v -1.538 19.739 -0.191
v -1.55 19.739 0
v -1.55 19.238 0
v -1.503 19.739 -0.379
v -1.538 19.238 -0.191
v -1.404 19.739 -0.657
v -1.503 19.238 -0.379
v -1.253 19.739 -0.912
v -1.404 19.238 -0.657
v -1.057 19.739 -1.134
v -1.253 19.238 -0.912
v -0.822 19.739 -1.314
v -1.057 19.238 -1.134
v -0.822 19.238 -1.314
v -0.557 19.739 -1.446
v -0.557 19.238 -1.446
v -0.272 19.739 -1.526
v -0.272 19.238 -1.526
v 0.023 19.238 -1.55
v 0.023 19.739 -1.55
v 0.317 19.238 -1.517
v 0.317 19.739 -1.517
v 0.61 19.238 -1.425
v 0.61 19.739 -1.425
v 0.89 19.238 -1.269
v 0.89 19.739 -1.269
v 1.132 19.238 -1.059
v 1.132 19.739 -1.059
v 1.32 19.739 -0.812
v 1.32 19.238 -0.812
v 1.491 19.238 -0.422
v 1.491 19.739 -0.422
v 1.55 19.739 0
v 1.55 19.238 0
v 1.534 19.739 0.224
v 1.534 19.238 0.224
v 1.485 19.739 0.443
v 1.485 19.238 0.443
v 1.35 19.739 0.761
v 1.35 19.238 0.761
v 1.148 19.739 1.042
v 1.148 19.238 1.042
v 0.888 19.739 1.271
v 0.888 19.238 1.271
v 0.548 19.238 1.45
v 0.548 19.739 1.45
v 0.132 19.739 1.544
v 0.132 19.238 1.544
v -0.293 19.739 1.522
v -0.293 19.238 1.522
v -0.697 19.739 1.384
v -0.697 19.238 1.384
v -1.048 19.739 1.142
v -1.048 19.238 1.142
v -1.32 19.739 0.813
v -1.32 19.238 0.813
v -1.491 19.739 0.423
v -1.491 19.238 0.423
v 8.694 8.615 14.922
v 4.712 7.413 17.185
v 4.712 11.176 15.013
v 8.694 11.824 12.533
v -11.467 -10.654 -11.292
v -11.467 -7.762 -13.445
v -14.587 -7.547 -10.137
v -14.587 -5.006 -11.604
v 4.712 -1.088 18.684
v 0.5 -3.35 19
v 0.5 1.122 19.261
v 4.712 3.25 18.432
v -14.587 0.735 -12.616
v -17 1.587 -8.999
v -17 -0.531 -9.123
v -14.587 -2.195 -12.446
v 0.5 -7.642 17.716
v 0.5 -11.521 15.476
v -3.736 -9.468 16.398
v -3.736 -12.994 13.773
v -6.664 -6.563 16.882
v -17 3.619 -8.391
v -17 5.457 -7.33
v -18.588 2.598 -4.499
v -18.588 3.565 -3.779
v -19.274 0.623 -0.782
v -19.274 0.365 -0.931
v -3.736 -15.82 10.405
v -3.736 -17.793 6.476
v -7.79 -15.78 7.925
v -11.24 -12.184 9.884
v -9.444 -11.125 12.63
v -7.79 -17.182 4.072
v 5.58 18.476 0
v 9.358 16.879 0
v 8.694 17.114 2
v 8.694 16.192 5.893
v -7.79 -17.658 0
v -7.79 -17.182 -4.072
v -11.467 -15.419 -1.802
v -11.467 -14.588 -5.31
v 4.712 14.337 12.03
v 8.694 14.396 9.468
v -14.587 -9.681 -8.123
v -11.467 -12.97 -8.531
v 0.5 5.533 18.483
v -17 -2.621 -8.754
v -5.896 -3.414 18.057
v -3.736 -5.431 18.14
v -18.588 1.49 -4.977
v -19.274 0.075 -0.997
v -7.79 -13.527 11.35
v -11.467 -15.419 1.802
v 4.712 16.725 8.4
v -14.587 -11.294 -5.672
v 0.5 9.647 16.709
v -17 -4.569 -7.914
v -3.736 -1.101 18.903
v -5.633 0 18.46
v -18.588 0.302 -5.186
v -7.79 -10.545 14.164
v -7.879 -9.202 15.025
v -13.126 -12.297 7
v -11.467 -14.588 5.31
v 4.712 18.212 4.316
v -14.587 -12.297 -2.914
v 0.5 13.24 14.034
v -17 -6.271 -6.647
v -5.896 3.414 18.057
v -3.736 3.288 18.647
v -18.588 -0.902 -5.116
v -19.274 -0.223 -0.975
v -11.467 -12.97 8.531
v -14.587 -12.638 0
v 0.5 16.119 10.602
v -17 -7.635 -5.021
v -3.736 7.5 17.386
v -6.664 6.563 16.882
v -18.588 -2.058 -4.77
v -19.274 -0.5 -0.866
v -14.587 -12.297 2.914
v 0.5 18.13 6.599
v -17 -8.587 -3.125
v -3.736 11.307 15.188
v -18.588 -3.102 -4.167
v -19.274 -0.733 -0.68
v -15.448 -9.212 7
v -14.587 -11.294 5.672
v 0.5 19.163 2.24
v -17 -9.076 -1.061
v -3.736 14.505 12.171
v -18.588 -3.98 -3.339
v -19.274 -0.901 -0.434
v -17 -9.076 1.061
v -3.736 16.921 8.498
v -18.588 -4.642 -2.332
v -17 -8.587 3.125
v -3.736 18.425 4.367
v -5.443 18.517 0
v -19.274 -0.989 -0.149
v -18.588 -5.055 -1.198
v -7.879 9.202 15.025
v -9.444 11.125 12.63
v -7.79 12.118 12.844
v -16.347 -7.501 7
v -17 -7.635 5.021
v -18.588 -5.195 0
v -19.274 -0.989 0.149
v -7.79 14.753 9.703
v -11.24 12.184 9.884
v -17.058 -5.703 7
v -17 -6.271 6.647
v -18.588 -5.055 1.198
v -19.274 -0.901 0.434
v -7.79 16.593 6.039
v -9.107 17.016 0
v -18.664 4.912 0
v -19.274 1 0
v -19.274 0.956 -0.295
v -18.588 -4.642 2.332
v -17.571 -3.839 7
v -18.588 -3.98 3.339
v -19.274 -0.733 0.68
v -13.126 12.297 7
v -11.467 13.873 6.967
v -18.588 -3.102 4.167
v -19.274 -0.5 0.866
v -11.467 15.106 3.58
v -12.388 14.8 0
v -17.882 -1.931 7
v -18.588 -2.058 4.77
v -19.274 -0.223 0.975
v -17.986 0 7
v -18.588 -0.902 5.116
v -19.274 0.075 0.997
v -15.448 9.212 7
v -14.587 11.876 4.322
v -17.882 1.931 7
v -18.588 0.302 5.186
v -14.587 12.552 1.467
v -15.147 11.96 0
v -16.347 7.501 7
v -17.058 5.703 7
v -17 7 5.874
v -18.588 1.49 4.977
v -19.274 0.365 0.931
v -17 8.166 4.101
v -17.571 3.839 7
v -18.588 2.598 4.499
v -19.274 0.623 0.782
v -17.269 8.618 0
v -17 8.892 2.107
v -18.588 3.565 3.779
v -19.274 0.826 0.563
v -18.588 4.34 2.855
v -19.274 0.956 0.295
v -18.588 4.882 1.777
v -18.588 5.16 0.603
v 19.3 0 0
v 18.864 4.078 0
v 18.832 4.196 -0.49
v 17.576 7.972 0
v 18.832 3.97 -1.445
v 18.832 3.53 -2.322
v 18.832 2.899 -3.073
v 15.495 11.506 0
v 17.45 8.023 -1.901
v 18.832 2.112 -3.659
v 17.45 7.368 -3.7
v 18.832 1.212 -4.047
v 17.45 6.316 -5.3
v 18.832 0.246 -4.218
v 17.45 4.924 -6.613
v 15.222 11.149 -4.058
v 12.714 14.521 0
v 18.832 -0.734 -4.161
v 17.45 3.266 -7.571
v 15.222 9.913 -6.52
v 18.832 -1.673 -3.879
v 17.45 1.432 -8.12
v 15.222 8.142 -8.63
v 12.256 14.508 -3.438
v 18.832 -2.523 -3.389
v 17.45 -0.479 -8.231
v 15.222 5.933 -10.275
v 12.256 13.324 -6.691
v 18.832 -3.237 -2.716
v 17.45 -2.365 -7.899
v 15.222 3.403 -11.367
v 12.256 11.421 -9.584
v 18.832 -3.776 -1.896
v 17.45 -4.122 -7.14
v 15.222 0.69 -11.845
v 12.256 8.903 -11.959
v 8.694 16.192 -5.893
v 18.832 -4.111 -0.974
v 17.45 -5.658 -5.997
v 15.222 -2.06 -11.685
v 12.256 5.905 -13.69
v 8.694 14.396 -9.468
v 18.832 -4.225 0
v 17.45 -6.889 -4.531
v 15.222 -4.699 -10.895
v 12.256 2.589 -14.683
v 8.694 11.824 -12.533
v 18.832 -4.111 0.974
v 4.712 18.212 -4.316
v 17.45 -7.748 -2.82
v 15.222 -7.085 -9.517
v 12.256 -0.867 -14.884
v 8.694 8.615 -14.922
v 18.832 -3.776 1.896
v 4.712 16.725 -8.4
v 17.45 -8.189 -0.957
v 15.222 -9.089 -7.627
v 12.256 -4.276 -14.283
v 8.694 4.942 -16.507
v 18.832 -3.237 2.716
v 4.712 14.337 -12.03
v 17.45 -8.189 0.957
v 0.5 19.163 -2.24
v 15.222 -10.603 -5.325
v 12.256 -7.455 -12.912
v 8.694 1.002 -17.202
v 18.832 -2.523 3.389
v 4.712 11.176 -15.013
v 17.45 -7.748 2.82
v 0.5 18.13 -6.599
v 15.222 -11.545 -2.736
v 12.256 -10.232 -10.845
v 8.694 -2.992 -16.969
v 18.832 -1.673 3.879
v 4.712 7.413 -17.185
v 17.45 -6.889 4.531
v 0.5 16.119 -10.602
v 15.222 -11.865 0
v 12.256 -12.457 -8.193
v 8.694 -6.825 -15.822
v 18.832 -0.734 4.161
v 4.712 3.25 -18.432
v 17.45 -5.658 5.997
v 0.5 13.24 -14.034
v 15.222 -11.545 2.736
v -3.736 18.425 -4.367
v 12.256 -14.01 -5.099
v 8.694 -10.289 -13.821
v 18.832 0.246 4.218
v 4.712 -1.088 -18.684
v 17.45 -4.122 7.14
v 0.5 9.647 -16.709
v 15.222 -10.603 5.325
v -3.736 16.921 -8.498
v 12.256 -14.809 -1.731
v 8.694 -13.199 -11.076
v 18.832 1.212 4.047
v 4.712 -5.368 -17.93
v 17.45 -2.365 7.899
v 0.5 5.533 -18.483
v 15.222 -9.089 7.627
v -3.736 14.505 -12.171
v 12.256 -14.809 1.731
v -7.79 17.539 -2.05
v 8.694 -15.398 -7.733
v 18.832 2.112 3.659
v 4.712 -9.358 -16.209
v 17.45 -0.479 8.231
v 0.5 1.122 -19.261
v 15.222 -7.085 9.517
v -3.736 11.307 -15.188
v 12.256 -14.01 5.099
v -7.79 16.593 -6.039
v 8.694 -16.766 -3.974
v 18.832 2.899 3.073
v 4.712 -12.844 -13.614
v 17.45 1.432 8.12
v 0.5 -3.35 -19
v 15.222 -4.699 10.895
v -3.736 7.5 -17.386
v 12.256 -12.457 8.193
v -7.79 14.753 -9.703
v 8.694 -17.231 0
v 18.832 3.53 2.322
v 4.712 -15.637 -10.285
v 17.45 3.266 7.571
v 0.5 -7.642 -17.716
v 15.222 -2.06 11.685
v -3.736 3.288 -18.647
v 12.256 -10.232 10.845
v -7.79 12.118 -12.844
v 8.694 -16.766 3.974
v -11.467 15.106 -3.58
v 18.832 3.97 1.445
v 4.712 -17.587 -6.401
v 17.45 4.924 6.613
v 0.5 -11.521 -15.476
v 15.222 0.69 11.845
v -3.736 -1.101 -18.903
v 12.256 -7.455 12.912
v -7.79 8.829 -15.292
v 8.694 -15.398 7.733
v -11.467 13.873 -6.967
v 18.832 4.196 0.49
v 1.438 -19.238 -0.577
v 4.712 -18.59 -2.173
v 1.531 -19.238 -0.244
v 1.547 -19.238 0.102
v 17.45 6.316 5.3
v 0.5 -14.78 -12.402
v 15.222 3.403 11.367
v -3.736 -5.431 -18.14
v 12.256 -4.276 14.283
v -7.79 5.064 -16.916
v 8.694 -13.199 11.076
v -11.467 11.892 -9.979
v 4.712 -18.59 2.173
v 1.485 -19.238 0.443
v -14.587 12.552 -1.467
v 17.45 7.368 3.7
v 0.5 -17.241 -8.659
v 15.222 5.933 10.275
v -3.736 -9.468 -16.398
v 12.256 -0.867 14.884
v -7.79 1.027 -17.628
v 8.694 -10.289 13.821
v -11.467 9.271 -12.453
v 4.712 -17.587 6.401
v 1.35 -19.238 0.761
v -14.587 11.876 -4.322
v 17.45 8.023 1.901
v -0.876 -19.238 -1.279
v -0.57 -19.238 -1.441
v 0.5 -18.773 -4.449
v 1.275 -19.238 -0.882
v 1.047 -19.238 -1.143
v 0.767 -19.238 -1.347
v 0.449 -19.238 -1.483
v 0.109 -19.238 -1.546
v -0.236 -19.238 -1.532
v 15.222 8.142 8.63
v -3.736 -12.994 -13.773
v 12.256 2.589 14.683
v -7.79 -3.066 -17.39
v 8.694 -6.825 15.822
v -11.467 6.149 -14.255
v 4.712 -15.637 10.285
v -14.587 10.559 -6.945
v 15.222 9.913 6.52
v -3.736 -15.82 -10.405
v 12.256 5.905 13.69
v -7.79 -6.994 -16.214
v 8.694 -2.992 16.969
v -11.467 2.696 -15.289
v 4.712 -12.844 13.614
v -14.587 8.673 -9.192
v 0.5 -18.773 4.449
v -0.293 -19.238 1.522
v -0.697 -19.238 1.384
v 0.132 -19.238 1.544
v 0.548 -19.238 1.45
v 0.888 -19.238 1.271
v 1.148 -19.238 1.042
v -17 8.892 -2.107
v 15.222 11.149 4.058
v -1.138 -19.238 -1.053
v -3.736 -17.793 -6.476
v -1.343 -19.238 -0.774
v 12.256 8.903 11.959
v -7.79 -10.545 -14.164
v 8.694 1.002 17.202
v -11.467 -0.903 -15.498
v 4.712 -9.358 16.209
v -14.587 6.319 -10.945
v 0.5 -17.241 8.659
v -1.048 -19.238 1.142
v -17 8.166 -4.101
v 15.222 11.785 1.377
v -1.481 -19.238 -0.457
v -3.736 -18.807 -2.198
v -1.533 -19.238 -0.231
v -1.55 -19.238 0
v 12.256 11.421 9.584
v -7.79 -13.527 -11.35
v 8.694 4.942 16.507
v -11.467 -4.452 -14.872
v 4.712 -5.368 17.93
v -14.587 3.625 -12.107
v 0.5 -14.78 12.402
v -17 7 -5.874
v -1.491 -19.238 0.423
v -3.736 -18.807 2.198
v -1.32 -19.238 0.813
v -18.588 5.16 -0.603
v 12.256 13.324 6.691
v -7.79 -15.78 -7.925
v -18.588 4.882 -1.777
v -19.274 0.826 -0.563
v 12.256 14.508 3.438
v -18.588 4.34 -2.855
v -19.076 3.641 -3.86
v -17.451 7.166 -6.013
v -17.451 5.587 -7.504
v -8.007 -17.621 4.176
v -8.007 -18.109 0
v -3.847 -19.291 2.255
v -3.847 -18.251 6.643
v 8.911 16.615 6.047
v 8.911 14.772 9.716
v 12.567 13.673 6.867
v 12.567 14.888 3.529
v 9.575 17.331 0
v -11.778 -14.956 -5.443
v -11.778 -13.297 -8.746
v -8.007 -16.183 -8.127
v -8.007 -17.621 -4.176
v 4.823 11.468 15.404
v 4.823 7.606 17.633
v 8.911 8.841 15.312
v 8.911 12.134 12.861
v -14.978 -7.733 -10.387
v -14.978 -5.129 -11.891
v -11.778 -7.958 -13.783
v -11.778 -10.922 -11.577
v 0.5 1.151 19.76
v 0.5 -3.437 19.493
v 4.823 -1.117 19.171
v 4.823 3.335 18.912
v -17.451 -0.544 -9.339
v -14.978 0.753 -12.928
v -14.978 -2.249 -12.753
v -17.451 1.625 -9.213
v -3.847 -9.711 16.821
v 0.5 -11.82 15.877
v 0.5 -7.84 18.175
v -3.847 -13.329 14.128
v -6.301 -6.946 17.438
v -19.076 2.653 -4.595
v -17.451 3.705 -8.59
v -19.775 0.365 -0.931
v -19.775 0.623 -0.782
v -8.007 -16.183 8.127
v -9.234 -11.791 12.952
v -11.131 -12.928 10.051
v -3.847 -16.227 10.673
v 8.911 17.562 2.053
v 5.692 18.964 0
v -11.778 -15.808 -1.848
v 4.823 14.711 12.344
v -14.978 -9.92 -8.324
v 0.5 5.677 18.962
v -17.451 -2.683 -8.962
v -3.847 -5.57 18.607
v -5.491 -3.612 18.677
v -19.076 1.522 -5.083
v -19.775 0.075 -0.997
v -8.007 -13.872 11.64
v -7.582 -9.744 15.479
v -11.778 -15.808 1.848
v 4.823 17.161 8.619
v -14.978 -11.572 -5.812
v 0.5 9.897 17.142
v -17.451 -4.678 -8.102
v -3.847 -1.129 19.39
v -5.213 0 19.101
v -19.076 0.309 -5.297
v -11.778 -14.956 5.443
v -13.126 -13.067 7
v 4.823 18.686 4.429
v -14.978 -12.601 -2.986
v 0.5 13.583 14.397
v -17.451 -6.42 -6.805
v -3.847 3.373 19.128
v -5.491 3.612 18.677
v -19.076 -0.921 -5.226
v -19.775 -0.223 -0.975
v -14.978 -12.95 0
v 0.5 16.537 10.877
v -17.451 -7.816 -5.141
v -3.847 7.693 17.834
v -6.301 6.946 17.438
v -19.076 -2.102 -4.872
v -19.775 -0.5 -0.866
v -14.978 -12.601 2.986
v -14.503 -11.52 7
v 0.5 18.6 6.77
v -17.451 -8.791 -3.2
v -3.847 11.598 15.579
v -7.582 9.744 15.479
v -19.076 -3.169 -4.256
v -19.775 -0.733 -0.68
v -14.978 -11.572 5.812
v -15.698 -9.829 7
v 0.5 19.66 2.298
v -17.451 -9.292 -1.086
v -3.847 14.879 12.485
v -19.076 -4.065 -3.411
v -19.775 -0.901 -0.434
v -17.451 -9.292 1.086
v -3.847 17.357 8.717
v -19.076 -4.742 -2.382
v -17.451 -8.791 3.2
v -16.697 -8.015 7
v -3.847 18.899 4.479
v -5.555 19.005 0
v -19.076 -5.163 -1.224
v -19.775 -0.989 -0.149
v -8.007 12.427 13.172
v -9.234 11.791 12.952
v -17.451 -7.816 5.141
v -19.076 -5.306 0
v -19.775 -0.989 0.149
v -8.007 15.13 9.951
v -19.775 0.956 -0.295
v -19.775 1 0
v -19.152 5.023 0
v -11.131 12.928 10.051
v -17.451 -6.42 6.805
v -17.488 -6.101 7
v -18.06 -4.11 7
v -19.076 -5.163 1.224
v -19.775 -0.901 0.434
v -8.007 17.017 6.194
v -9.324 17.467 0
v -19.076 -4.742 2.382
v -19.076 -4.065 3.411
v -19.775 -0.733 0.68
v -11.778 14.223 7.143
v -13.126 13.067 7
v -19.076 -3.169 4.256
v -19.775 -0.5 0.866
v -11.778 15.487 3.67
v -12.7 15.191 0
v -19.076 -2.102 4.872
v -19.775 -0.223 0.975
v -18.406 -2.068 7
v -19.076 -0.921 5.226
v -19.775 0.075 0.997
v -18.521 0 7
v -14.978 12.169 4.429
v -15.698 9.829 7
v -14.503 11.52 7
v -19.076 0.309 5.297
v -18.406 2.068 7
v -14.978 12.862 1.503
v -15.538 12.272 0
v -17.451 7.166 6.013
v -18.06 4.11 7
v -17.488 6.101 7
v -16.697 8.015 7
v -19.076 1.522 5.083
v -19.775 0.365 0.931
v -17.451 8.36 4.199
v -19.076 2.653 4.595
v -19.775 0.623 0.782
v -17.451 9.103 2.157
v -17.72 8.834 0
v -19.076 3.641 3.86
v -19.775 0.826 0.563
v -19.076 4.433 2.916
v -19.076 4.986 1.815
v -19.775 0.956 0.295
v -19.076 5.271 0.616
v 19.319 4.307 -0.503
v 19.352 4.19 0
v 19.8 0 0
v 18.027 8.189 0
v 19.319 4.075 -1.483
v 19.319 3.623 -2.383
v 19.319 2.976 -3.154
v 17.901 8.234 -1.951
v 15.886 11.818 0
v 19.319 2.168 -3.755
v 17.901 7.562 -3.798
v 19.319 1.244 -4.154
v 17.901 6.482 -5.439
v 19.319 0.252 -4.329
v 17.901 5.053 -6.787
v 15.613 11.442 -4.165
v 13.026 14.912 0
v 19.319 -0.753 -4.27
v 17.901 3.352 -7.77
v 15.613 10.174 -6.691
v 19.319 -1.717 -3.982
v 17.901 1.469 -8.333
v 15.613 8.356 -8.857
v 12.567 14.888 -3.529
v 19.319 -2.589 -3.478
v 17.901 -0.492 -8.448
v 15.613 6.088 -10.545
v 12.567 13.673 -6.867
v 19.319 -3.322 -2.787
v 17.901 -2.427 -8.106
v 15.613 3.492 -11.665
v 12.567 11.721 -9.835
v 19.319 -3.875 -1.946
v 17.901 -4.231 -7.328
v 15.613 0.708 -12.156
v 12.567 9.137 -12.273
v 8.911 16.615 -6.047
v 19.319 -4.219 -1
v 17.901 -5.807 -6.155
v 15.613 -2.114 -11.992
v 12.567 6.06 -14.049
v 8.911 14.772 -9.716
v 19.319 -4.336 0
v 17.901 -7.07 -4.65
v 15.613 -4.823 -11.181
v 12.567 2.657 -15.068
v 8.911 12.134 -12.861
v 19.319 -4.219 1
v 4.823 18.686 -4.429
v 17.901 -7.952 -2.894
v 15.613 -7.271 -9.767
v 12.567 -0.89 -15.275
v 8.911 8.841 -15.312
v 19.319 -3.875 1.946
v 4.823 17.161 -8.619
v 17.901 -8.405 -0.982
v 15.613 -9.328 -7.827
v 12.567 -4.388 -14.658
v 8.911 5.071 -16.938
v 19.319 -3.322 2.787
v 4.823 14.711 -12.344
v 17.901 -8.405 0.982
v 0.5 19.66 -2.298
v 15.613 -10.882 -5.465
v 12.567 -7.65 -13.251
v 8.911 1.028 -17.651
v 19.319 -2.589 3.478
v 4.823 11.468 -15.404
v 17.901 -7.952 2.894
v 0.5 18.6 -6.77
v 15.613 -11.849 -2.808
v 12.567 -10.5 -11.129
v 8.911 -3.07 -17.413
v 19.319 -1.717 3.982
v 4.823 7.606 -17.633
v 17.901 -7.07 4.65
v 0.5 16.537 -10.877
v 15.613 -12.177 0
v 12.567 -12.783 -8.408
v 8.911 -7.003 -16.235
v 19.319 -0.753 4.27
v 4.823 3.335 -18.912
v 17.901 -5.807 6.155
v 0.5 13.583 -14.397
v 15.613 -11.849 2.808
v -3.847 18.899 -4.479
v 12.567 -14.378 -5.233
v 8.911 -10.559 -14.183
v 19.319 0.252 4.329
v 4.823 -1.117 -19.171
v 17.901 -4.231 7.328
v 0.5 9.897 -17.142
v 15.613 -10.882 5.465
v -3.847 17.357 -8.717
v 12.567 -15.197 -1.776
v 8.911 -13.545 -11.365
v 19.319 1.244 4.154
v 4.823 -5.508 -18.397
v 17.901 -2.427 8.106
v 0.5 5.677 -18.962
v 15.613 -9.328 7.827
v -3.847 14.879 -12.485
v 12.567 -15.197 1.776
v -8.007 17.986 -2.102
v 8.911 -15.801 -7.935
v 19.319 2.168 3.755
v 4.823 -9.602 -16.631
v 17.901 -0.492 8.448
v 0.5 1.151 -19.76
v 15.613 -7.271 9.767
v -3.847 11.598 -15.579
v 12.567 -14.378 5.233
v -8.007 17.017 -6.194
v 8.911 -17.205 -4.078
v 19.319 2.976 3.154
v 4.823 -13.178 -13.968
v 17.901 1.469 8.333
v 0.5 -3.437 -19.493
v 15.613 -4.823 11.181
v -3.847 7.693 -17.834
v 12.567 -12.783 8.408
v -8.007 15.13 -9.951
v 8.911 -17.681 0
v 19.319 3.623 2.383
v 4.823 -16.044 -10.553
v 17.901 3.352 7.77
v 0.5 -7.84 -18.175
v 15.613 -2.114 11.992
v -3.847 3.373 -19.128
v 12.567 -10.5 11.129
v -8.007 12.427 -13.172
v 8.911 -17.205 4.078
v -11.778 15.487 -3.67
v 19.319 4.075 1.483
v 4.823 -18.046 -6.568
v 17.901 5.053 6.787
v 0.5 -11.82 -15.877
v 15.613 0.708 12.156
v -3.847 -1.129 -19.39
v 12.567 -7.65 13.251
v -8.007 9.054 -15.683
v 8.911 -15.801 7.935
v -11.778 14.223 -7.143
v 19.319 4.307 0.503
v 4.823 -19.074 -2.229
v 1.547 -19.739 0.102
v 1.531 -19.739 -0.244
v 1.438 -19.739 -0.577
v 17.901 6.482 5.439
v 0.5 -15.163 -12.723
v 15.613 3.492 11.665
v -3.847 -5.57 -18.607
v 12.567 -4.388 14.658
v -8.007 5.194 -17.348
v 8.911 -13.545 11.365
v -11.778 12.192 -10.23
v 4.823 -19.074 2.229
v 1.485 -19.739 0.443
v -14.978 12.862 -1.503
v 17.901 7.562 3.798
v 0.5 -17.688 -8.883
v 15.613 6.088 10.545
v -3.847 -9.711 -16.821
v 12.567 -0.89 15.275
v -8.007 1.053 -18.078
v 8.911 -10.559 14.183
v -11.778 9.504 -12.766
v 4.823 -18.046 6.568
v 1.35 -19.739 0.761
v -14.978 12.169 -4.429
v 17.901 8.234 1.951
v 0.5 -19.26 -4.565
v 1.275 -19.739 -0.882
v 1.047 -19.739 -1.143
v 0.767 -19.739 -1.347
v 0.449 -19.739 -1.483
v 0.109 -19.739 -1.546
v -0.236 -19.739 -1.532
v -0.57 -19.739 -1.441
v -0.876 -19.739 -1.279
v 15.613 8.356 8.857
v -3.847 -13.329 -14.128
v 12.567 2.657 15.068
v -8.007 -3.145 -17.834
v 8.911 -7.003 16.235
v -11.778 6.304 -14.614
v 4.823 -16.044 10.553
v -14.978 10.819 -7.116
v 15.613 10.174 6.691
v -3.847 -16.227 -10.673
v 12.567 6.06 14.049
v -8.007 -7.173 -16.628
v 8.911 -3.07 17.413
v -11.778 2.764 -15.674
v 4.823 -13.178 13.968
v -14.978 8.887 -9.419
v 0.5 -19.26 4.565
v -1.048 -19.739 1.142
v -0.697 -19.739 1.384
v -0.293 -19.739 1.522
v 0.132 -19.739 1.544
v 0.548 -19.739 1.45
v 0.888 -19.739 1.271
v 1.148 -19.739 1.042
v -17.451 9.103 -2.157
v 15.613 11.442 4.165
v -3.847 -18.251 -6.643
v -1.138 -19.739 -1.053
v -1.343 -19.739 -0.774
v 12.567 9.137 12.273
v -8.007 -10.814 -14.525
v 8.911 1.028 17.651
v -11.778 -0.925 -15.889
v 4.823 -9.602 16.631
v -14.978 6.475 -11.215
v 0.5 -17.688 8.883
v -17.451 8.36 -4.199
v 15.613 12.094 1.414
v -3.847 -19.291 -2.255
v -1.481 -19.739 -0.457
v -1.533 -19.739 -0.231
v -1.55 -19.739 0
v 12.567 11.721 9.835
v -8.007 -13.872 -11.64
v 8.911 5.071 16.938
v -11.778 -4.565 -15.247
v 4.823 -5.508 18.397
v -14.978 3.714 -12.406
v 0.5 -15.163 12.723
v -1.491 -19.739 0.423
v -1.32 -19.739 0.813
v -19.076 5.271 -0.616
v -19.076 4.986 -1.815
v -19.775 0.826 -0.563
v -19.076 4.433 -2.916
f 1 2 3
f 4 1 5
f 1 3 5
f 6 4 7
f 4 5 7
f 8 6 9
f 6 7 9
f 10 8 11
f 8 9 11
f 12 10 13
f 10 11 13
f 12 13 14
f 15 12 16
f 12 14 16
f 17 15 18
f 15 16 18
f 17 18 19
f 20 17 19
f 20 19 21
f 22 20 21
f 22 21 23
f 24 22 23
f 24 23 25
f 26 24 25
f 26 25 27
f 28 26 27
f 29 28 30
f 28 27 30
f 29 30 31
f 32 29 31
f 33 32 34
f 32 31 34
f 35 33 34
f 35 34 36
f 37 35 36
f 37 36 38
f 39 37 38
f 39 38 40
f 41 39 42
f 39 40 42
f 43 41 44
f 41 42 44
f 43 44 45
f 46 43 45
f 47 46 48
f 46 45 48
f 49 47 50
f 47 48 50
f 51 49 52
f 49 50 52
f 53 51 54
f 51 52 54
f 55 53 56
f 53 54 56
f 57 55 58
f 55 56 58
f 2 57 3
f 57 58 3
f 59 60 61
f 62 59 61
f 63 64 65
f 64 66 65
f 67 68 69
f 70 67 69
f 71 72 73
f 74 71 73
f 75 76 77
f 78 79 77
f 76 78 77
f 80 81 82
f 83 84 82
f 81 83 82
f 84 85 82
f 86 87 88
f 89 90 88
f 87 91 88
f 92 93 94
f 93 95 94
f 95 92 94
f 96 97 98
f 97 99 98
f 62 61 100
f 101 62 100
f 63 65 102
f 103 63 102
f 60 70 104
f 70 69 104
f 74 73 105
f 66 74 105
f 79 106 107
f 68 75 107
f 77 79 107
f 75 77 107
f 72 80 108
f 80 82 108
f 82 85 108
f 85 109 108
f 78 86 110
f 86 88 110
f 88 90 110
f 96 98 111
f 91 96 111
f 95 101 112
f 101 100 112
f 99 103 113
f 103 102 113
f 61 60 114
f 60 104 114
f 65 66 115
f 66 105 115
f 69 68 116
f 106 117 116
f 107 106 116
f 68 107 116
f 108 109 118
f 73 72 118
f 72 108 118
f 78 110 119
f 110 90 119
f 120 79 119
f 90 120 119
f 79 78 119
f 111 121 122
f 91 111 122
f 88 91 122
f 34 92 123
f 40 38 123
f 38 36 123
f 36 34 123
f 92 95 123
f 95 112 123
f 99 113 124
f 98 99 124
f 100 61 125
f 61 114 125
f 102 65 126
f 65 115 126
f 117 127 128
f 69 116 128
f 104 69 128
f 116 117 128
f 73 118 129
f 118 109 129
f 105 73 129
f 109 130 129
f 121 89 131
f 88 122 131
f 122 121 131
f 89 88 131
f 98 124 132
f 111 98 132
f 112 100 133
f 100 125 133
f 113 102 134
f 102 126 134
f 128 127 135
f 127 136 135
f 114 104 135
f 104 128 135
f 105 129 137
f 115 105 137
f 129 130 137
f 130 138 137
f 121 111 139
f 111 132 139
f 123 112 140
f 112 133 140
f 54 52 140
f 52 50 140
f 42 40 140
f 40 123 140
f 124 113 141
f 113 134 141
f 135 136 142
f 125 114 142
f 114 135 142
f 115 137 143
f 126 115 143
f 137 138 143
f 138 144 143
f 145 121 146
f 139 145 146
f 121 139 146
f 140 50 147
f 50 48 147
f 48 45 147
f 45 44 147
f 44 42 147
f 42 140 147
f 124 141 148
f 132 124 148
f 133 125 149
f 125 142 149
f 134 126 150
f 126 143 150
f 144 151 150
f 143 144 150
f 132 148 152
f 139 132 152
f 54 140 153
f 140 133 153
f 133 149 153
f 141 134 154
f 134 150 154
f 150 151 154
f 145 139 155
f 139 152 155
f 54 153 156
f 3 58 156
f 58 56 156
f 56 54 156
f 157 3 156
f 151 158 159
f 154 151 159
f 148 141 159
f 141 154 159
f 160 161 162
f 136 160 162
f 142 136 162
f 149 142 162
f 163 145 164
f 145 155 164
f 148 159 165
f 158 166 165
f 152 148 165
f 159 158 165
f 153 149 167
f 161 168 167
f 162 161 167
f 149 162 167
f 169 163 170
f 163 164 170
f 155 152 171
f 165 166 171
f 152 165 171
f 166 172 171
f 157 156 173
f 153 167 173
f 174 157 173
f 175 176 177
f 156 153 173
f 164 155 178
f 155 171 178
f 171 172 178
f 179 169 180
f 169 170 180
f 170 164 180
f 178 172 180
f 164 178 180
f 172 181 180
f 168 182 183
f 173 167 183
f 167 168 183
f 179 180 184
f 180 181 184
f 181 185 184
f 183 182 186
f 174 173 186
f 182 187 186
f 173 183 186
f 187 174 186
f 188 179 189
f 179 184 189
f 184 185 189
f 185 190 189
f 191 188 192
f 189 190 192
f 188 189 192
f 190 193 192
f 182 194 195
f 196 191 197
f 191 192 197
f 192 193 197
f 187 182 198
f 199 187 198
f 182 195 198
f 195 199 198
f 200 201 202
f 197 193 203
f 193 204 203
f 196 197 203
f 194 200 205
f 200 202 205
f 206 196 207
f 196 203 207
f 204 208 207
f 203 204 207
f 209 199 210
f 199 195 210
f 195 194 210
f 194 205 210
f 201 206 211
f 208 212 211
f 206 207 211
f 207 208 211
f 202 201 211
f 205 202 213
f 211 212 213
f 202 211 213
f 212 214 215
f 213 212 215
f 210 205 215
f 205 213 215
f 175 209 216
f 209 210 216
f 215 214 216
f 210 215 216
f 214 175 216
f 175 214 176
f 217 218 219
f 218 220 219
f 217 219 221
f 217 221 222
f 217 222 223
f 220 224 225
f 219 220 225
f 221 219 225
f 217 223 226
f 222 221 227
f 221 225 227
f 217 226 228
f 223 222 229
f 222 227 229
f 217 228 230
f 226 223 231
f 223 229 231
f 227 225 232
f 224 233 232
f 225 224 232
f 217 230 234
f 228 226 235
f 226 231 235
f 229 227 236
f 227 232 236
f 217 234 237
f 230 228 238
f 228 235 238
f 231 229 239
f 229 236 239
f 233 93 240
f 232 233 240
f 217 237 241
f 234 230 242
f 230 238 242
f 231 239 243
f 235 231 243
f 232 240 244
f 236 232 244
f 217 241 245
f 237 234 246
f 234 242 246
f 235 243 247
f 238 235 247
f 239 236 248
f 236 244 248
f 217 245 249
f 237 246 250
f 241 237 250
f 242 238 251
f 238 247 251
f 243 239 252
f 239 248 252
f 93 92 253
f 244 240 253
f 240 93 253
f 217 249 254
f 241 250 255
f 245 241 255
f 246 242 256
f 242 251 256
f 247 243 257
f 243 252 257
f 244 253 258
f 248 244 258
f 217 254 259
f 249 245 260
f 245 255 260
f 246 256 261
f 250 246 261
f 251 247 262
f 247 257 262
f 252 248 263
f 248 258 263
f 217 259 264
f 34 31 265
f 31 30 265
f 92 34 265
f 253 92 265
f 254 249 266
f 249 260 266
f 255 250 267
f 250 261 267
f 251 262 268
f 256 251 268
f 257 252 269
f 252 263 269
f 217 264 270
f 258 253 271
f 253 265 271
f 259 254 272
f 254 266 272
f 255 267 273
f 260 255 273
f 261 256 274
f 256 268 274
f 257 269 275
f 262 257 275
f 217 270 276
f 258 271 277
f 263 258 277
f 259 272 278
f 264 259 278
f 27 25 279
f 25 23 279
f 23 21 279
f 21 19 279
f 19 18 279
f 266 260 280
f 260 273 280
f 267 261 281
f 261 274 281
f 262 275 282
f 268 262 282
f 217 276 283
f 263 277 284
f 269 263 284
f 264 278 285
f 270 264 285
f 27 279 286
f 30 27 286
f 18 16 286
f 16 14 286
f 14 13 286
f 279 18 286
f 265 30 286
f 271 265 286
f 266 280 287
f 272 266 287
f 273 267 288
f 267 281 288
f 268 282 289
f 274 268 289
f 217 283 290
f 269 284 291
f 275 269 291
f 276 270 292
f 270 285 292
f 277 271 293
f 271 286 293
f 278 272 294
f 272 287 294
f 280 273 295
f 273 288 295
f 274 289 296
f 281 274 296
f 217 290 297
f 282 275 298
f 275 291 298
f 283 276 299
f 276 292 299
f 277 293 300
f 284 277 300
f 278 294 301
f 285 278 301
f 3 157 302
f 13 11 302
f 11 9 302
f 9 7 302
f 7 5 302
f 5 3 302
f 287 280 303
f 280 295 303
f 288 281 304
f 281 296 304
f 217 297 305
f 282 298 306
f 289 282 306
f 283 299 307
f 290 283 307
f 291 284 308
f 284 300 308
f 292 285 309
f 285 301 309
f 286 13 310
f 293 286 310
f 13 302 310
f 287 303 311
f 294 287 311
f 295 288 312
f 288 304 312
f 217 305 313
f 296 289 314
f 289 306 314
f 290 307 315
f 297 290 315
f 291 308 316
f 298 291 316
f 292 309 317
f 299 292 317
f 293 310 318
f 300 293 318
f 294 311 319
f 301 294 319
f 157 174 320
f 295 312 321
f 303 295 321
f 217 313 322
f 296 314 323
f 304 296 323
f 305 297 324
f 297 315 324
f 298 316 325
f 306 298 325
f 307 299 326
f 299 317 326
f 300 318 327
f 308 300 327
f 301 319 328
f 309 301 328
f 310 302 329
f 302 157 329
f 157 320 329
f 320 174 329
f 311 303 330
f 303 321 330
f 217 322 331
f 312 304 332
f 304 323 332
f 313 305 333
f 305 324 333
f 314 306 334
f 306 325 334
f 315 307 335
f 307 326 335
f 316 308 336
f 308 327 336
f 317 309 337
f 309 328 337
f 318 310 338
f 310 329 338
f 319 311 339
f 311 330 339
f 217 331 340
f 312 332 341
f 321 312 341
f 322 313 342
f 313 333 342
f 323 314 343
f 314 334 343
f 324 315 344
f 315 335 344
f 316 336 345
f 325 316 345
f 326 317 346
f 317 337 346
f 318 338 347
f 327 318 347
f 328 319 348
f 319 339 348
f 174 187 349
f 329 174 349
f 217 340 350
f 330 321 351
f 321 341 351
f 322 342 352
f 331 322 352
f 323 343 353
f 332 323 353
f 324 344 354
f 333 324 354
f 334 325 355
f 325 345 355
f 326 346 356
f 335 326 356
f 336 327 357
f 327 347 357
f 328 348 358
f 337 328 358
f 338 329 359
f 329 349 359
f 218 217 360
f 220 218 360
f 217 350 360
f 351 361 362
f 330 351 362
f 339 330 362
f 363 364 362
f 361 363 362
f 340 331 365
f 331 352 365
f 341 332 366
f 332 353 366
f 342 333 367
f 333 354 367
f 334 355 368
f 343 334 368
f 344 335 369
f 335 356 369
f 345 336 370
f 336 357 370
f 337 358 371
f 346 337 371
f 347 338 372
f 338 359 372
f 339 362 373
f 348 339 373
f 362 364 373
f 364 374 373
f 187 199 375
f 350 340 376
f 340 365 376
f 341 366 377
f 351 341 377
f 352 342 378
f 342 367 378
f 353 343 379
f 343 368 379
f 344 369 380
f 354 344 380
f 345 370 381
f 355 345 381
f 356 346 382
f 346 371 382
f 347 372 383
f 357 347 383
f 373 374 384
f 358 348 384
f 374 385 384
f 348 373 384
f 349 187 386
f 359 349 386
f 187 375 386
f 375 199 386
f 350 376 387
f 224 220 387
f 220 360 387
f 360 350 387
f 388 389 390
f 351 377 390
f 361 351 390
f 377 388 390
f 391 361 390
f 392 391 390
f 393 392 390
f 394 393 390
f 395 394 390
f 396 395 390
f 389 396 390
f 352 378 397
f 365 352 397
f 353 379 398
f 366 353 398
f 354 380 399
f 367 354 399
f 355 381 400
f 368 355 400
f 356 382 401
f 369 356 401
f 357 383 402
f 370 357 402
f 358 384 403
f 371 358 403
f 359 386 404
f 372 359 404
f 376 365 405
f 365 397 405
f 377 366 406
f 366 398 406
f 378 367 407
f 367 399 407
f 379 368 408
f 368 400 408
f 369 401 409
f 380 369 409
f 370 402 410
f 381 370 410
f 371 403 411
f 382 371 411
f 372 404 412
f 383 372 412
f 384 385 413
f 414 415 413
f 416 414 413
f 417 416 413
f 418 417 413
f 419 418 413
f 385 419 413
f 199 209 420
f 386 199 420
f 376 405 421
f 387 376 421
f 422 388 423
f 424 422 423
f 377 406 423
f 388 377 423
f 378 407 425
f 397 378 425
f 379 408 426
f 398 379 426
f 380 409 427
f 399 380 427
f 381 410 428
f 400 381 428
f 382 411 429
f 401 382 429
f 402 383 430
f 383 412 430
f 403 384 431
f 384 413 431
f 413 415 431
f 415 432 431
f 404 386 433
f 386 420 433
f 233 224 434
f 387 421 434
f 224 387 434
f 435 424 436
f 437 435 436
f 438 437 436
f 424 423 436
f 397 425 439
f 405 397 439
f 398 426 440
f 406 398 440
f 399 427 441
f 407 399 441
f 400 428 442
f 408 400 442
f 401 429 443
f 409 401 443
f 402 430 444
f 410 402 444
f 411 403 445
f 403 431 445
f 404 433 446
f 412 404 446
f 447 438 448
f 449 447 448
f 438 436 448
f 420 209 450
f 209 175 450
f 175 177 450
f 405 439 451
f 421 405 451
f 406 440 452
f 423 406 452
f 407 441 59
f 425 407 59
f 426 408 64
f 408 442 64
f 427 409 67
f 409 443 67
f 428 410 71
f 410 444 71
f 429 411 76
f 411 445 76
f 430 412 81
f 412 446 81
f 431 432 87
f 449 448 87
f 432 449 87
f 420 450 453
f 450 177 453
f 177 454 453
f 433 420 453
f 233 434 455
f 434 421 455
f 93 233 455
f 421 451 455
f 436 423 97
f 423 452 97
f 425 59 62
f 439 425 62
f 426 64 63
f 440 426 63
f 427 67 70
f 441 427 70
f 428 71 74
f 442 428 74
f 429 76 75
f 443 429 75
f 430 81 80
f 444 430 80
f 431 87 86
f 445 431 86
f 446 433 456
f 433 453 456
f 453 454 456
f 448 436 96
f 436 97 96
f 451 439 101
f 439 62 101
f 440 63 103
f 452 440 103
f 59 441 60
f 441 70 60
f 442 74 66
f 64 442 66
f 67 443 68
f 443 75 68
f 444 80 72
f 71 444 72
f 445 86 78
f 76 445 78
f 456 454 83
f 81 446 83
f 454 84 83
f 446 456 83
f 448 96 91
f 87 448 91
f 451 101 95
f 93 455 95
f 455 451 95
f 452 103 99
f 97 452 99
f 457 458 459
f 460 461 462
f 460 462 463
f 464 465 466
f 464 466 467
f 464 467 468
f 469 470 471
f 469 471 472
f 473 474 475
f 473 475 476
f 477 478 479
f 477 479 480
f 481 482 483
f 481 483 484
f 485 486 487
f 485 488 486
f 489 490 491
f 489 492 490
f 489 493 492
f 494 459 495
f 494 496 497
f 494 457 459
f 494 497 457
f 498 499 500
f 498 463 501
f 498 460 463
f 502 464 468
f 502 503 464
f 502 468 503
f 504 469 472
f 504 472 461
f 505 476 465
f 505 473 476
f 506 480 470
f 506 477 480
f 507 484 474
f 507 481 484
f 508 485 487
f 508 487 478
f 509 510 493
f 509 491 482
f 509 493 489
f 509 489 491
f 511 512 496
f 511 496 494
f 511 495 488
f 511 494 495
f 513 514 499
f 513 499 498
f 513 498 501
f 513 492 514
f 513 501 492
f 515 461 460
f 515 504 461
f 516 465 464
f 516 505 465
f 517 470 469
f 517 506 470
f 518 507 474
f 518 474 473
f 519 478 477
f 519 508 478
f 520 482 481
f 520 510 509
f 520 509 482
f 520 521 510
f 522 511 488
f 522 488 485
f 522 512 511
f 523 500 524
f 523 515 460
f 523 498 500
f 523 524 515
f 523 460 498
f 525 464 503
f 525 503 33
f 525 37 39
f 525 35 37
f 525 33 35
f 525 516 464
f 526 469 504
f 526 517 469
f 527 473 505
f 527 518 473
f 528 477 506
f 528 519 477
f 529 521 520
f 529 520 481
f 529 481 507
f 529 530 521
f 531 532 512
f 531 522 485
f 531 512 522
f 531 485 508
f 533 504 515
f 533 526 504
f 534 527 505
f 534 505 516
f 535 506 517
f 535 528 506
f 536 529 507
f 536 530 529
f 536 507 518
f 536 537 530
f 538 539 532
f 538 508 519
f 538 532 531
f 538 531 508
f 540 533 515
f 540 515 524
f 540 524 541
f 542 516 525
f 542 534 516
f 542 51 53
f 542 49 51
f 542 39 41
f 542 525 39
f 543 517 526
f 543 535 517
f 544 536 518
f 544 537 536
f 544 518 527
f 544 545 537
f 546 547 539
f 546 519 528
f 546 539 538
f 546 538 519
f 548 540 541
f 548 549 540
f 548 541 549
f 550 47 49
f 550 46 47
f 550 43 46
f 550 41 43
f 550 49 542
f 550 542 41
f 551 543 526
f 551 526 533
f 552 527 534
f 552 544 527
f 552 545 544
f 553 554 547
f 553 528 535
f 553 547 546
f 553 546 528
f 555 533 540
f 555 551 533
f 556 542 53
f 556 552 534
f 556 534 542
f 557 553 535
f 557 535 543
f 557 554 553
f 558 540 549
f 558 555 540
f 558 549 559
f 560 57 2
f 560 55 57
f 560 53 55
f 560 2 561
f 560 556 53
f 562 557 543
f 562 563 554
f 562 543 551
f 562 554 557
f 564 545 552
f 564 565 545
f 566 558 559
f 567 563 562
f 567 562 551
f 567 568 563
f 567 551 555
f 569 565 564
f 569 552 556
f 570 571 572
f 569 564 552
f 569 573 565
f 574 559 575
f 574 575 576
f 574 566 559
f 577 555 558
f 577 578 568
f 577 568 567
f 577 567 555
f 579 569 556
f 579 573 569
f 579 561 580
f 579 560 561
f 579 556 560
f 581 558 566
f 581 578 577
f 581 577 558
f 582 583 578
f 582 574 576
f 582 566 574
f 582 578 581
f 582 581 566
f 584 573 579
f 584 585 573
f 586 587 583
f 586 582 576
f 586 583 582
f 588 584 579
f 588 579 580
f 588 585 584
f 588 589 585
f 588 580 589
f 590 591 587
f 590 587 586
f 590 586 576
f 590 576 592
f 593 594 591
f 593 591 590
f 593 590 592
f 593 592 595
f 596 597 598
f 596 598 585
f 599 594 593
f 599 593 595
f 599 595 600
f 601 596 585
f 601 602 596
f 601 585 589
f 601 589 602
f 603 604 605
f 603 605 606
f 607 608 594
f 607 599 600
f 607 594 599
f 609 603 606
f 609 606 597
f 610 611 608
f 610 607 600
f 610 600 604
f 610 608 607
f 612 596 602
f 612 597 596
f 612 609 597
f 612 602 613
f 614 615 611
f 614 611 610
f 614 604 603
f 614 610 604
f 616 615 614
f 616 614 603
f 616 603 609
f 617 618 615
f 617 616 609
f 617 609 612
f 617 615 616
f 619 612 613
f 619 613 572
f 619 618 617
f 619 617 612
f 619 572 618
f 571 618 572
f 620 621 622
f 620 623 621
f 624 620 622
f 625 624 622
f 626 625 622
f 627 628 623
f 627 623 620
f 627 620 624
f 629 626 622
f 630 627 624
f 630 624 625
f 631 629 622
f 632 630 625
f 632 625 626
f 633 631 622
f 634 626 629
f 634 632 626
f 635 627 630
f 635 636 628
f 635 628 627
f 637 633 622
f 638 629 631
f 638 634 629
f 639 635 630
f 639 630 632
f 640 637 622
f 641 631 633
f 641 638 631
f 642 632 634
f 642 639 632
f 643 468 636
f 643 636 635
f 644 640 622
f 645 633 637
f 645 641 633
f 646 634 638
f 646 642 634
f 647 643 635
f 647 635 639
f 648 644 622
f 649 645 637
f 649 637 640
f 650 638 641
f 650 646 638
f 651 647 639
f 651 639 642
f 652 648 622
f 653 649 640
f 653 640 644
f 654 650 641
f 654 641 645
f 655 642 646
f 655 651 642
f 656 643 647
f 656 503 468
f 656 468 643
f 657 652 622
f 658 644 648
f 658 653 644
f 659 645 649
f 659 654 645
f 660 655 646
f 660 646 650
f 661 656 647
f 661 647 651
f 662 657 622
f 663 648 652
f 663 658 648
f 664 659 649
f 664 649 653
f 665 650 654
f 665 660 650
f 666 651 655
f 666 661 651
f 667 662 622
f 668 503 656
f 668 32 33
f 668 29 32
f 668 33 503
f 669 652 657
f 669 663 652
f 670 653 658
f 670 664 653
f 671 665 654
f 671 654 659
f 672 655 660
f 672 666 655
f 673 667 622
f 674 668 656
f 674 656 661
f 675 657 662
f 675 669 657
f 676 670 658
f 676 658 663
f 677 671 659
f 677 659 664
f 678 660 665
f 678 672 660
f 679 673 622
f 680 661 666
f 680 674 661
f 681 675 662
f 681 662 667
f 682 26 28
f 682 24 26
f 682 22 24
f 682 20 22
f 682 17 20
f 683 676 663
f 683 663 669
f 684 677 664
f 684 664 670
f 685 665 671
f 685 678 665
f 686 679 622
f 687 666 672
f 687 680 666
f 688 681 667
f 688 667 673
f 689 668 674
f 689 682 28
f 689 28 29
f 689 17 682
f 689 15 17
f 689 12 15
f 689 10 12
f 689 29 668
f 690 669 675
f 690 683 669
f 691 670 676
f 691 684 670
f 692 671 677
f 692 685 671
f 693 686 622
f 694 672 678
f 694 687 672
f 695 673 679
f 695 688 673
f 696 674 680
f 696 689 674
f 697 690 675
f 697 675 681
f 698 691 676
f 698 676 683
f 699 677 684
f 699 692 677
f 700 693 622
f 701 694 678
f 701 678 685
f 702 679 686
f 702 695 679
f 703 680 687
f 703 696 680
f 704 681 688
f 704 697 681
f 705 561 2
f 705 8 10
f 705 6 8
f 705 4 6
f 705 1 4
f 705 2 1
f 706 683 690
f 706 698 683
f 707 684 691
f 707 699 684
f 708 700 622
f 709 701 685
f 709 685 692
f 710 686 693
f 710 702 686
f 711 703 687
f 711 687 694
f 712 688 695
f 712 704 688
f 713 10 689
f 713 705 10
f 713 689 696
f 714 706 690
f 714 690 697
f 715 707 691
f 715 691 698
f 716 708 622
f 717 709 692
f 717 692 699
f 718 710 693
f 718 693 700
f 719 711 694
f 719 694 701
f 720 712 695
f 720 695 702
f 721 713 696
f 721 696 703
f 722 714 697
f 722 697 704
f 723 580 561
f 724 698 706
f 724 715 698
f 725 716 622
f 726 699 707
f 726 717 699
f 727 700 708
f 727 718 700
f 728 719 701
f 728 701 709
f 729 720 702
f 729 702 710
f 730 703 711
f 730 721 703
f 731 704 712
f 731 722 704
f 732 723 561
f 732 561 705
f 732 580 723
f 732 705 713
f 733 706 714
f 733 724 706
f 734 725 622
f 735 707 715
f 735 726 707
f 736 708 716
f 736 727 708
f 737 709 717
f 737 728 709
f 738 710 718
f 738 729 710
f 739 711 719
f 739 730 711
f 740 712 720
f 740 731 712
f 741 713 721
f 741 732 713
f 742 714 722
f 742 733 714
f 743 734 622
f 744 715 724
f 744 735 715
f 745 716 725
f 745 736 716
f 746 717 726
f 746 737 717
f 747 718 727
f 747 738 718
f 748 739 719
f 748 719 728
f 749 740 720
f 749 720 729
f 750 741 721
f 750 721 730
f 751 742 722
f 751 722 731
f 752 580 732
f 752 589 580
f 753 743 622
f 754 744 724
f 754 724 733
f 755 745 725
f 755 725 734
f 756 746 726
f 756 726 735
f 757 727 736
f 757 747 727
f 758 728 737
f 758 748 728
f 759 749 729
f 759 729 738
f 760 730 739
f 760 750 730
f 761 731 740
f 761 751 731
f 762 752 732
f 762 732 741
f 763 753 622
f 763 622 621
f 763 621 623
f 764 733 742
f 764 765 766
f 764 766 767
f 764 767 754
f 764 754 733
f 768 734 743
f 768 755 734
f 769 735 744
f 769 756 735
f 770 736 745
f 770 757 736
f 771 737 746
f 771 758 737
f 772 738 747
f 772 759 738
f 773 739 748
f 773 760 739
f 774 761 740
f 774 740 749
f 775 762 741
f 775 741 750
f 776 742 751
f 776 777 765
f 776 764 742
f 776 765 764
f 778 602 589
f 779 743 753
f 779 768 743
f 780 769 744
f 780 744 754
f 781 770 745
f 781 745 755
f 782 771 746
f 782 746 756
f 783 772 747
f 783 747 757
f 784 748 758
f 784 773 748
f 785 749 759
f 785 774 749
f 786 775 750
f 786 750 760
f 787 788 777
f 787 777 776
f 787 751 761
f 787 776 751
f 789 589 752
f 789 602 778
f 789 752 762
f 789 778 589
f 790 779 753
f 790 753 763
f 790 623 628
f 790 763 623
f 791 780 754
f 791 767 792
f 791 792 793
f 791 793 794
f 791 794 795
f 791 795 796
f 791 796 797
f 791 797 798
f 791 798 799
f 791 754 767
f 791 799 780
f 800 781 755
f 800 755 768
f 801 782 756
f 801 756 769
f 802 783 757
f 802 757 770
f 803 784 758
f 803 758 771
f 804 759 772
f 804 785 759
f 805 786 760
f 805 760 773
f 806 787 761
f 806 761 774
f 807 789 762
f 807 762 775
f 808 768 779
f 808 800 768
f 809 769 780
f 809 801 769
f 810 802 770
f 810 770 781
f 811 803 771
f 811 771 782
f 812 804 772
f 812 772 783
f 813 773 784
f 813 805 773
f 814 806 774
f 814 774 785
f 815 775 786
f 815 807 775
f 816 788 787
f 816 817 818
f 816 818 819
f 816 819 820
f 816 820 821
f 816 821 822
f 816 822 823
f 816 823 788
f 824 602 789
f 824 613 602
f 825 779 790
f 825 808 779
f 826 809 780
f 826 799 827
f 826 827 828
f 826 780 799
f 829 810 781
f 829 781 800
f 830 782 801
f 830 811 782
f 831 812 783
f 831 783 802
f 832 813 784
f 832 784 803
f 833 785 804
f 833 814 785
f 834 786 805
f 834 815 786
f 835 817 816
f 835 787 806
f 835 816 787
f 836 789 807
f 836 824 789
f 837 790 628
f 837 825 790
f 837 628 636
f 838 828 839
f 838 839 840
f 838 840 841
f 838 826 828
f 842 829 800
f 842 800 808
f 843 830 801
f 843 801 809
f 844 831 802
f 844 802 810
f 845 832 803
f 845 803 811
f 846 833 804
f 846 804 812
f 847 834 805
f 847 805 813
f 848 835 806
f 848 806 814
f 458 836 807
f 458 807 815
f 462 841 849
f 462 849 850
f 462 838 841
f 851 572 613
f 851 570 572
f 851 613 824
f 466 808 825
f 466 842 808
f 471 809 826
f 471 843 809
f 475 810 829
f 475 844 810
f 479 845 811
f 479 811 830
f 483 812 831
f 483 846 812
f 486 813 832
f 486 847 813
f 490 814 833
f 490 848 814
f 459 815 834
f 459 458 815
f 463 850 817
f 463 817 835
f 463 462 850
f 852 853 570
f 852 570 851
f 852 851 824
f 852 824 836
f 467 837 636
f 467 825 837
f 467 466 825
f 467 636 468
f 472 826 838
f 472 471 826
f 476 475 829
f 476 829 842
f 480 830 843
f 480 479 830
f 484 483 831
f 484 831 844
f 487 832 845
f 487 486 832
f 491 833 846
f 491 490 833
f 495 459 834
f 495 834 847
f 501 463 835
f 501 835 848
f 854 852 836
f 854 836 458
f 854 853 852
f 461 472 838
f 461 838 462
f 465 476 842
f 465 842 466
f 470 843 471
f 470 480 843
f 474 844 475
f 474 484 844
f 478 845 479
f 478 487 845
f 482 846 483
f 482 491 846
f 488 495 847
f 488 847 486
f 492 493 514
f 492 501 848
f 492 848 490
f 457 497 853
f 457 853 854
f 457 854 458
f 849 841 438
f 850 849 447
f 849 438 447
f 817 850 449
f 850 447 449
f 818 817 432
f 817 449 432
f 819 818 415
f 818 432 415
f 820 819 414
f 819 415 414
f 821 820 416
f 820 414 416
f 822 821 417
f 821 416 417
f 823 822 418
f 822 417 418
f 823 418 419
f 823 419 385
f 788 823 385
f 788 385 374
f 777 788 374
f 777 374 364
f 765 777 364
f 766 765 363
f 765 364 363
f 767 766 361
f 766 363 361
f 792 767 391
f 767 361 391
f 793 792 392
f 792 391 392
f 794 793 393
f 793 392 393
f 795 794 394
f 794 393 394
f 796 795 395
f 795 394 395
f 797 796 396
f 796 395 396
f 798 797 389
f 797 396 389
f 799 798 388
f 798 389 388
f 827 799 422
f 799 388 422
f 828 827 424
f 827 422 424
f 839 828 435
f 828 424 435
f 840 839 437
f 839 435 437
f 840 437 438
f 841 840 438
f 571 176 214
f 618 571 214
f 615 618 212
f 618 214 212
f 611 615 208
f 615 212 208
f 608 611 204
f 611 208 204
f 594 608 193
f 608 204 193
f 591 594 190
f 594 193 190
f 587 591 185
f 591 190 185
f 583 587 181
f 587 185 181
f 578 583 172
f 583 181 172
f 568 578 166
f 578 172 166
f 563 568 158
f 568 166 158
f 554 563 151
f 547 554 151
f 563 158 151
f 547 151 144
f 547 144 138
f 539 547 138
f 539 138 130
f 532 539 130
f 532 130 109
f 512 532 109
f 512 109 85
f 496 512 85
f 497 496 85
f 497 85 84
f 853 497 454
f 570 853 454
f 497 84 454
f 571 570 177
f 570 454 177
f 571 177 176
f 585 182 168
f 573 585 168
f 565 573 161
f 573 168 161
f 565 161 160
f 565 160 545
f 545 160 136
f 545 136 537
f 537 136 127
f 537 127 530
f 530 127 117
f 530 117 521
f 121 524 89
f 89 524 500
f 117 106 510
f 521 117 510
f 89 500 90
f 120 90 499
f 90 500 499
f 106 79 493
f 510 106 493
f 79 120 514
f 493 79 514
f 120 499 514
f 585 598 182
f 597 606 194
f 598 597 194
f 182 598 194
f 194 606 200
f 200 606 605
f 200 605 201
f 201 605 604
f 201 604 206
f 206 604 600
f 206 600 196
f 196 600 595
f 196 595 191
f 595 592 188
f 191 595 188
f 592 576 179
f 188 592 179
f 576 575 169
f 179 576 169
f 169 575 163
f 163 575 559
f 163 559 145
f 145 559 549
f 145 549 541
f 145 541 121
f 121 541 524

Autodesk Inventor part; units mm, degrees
sketch "Sketch1" plane through (0, 0, 0) normal (0, 0, 1) x (1, 0, 0)
  line L0 (15.9491, 0) -> (16.0494, 0)
  line L1 (-19.8, 0) -> (19.8, 0)
  arc A0 (19.8, 0) -> (-19.8, 0) centre (0, 0) ccw
  dimension "d32" = 39.6
ref_plane "Work Plane1" through (0, 0, 7) normal (0, 0, 1) x (1, 0, 0)
revolve "Revolution3" add sketch "Sketch1" angle 360 about axis through (15.9491, 0, 0) along (1, 0, 0)
ref_plane "Work Plane2" through (0, 0, 11) normal (0, 0, 1) x (1, 0, 0)
sketch "Sketch17" plane through (0, 0, 0) normal (0, 1, 0) x (-1, 0, 0)
  line L0 (26.807, 7) -> (13.1257, 7)
  line L1 (13.1257, 7) -> (3.4348, 21.8215)
  line L2 (3.4348, 21.8215) -> (26.807, 7)
  point P0 (0, 0)
  dimension "d50" = 7
extrude "Extrusion10" cut sketch "Sketch17" along normal through all both and the other way through all
shell "Shell4" thickness 0.5 removed faces 2 at (-15.7431, -1.7688, 7) at (-10.8801, -4.3558, 10.4345)
sketch "Sketch16" plane through (0, 0, 0) normal (0, 1, 0) x (-1, 0, 0)
  circle A0 centre (0, 0) radius 1.55
  dimension "d39" = 3.1
extrude "Extrusion9" cut sketch "Sketch16" along normal through all both and the other way through all
sketch "Sketch18" plane through (0, 0, 0) normal (1, 0, 0) x (0, 1, 0)
  circle A0 centre (0, 0) radius 1
  dimension "d46" = 2
extrude "Extrusion11" cut sketch "Sketch18" against normal through all
ref_plane "Work Plane3" through (0, 0, -20.5) normal (0, 0, 1) x (1, 0, 0)
properties part number "ping pong ball"
